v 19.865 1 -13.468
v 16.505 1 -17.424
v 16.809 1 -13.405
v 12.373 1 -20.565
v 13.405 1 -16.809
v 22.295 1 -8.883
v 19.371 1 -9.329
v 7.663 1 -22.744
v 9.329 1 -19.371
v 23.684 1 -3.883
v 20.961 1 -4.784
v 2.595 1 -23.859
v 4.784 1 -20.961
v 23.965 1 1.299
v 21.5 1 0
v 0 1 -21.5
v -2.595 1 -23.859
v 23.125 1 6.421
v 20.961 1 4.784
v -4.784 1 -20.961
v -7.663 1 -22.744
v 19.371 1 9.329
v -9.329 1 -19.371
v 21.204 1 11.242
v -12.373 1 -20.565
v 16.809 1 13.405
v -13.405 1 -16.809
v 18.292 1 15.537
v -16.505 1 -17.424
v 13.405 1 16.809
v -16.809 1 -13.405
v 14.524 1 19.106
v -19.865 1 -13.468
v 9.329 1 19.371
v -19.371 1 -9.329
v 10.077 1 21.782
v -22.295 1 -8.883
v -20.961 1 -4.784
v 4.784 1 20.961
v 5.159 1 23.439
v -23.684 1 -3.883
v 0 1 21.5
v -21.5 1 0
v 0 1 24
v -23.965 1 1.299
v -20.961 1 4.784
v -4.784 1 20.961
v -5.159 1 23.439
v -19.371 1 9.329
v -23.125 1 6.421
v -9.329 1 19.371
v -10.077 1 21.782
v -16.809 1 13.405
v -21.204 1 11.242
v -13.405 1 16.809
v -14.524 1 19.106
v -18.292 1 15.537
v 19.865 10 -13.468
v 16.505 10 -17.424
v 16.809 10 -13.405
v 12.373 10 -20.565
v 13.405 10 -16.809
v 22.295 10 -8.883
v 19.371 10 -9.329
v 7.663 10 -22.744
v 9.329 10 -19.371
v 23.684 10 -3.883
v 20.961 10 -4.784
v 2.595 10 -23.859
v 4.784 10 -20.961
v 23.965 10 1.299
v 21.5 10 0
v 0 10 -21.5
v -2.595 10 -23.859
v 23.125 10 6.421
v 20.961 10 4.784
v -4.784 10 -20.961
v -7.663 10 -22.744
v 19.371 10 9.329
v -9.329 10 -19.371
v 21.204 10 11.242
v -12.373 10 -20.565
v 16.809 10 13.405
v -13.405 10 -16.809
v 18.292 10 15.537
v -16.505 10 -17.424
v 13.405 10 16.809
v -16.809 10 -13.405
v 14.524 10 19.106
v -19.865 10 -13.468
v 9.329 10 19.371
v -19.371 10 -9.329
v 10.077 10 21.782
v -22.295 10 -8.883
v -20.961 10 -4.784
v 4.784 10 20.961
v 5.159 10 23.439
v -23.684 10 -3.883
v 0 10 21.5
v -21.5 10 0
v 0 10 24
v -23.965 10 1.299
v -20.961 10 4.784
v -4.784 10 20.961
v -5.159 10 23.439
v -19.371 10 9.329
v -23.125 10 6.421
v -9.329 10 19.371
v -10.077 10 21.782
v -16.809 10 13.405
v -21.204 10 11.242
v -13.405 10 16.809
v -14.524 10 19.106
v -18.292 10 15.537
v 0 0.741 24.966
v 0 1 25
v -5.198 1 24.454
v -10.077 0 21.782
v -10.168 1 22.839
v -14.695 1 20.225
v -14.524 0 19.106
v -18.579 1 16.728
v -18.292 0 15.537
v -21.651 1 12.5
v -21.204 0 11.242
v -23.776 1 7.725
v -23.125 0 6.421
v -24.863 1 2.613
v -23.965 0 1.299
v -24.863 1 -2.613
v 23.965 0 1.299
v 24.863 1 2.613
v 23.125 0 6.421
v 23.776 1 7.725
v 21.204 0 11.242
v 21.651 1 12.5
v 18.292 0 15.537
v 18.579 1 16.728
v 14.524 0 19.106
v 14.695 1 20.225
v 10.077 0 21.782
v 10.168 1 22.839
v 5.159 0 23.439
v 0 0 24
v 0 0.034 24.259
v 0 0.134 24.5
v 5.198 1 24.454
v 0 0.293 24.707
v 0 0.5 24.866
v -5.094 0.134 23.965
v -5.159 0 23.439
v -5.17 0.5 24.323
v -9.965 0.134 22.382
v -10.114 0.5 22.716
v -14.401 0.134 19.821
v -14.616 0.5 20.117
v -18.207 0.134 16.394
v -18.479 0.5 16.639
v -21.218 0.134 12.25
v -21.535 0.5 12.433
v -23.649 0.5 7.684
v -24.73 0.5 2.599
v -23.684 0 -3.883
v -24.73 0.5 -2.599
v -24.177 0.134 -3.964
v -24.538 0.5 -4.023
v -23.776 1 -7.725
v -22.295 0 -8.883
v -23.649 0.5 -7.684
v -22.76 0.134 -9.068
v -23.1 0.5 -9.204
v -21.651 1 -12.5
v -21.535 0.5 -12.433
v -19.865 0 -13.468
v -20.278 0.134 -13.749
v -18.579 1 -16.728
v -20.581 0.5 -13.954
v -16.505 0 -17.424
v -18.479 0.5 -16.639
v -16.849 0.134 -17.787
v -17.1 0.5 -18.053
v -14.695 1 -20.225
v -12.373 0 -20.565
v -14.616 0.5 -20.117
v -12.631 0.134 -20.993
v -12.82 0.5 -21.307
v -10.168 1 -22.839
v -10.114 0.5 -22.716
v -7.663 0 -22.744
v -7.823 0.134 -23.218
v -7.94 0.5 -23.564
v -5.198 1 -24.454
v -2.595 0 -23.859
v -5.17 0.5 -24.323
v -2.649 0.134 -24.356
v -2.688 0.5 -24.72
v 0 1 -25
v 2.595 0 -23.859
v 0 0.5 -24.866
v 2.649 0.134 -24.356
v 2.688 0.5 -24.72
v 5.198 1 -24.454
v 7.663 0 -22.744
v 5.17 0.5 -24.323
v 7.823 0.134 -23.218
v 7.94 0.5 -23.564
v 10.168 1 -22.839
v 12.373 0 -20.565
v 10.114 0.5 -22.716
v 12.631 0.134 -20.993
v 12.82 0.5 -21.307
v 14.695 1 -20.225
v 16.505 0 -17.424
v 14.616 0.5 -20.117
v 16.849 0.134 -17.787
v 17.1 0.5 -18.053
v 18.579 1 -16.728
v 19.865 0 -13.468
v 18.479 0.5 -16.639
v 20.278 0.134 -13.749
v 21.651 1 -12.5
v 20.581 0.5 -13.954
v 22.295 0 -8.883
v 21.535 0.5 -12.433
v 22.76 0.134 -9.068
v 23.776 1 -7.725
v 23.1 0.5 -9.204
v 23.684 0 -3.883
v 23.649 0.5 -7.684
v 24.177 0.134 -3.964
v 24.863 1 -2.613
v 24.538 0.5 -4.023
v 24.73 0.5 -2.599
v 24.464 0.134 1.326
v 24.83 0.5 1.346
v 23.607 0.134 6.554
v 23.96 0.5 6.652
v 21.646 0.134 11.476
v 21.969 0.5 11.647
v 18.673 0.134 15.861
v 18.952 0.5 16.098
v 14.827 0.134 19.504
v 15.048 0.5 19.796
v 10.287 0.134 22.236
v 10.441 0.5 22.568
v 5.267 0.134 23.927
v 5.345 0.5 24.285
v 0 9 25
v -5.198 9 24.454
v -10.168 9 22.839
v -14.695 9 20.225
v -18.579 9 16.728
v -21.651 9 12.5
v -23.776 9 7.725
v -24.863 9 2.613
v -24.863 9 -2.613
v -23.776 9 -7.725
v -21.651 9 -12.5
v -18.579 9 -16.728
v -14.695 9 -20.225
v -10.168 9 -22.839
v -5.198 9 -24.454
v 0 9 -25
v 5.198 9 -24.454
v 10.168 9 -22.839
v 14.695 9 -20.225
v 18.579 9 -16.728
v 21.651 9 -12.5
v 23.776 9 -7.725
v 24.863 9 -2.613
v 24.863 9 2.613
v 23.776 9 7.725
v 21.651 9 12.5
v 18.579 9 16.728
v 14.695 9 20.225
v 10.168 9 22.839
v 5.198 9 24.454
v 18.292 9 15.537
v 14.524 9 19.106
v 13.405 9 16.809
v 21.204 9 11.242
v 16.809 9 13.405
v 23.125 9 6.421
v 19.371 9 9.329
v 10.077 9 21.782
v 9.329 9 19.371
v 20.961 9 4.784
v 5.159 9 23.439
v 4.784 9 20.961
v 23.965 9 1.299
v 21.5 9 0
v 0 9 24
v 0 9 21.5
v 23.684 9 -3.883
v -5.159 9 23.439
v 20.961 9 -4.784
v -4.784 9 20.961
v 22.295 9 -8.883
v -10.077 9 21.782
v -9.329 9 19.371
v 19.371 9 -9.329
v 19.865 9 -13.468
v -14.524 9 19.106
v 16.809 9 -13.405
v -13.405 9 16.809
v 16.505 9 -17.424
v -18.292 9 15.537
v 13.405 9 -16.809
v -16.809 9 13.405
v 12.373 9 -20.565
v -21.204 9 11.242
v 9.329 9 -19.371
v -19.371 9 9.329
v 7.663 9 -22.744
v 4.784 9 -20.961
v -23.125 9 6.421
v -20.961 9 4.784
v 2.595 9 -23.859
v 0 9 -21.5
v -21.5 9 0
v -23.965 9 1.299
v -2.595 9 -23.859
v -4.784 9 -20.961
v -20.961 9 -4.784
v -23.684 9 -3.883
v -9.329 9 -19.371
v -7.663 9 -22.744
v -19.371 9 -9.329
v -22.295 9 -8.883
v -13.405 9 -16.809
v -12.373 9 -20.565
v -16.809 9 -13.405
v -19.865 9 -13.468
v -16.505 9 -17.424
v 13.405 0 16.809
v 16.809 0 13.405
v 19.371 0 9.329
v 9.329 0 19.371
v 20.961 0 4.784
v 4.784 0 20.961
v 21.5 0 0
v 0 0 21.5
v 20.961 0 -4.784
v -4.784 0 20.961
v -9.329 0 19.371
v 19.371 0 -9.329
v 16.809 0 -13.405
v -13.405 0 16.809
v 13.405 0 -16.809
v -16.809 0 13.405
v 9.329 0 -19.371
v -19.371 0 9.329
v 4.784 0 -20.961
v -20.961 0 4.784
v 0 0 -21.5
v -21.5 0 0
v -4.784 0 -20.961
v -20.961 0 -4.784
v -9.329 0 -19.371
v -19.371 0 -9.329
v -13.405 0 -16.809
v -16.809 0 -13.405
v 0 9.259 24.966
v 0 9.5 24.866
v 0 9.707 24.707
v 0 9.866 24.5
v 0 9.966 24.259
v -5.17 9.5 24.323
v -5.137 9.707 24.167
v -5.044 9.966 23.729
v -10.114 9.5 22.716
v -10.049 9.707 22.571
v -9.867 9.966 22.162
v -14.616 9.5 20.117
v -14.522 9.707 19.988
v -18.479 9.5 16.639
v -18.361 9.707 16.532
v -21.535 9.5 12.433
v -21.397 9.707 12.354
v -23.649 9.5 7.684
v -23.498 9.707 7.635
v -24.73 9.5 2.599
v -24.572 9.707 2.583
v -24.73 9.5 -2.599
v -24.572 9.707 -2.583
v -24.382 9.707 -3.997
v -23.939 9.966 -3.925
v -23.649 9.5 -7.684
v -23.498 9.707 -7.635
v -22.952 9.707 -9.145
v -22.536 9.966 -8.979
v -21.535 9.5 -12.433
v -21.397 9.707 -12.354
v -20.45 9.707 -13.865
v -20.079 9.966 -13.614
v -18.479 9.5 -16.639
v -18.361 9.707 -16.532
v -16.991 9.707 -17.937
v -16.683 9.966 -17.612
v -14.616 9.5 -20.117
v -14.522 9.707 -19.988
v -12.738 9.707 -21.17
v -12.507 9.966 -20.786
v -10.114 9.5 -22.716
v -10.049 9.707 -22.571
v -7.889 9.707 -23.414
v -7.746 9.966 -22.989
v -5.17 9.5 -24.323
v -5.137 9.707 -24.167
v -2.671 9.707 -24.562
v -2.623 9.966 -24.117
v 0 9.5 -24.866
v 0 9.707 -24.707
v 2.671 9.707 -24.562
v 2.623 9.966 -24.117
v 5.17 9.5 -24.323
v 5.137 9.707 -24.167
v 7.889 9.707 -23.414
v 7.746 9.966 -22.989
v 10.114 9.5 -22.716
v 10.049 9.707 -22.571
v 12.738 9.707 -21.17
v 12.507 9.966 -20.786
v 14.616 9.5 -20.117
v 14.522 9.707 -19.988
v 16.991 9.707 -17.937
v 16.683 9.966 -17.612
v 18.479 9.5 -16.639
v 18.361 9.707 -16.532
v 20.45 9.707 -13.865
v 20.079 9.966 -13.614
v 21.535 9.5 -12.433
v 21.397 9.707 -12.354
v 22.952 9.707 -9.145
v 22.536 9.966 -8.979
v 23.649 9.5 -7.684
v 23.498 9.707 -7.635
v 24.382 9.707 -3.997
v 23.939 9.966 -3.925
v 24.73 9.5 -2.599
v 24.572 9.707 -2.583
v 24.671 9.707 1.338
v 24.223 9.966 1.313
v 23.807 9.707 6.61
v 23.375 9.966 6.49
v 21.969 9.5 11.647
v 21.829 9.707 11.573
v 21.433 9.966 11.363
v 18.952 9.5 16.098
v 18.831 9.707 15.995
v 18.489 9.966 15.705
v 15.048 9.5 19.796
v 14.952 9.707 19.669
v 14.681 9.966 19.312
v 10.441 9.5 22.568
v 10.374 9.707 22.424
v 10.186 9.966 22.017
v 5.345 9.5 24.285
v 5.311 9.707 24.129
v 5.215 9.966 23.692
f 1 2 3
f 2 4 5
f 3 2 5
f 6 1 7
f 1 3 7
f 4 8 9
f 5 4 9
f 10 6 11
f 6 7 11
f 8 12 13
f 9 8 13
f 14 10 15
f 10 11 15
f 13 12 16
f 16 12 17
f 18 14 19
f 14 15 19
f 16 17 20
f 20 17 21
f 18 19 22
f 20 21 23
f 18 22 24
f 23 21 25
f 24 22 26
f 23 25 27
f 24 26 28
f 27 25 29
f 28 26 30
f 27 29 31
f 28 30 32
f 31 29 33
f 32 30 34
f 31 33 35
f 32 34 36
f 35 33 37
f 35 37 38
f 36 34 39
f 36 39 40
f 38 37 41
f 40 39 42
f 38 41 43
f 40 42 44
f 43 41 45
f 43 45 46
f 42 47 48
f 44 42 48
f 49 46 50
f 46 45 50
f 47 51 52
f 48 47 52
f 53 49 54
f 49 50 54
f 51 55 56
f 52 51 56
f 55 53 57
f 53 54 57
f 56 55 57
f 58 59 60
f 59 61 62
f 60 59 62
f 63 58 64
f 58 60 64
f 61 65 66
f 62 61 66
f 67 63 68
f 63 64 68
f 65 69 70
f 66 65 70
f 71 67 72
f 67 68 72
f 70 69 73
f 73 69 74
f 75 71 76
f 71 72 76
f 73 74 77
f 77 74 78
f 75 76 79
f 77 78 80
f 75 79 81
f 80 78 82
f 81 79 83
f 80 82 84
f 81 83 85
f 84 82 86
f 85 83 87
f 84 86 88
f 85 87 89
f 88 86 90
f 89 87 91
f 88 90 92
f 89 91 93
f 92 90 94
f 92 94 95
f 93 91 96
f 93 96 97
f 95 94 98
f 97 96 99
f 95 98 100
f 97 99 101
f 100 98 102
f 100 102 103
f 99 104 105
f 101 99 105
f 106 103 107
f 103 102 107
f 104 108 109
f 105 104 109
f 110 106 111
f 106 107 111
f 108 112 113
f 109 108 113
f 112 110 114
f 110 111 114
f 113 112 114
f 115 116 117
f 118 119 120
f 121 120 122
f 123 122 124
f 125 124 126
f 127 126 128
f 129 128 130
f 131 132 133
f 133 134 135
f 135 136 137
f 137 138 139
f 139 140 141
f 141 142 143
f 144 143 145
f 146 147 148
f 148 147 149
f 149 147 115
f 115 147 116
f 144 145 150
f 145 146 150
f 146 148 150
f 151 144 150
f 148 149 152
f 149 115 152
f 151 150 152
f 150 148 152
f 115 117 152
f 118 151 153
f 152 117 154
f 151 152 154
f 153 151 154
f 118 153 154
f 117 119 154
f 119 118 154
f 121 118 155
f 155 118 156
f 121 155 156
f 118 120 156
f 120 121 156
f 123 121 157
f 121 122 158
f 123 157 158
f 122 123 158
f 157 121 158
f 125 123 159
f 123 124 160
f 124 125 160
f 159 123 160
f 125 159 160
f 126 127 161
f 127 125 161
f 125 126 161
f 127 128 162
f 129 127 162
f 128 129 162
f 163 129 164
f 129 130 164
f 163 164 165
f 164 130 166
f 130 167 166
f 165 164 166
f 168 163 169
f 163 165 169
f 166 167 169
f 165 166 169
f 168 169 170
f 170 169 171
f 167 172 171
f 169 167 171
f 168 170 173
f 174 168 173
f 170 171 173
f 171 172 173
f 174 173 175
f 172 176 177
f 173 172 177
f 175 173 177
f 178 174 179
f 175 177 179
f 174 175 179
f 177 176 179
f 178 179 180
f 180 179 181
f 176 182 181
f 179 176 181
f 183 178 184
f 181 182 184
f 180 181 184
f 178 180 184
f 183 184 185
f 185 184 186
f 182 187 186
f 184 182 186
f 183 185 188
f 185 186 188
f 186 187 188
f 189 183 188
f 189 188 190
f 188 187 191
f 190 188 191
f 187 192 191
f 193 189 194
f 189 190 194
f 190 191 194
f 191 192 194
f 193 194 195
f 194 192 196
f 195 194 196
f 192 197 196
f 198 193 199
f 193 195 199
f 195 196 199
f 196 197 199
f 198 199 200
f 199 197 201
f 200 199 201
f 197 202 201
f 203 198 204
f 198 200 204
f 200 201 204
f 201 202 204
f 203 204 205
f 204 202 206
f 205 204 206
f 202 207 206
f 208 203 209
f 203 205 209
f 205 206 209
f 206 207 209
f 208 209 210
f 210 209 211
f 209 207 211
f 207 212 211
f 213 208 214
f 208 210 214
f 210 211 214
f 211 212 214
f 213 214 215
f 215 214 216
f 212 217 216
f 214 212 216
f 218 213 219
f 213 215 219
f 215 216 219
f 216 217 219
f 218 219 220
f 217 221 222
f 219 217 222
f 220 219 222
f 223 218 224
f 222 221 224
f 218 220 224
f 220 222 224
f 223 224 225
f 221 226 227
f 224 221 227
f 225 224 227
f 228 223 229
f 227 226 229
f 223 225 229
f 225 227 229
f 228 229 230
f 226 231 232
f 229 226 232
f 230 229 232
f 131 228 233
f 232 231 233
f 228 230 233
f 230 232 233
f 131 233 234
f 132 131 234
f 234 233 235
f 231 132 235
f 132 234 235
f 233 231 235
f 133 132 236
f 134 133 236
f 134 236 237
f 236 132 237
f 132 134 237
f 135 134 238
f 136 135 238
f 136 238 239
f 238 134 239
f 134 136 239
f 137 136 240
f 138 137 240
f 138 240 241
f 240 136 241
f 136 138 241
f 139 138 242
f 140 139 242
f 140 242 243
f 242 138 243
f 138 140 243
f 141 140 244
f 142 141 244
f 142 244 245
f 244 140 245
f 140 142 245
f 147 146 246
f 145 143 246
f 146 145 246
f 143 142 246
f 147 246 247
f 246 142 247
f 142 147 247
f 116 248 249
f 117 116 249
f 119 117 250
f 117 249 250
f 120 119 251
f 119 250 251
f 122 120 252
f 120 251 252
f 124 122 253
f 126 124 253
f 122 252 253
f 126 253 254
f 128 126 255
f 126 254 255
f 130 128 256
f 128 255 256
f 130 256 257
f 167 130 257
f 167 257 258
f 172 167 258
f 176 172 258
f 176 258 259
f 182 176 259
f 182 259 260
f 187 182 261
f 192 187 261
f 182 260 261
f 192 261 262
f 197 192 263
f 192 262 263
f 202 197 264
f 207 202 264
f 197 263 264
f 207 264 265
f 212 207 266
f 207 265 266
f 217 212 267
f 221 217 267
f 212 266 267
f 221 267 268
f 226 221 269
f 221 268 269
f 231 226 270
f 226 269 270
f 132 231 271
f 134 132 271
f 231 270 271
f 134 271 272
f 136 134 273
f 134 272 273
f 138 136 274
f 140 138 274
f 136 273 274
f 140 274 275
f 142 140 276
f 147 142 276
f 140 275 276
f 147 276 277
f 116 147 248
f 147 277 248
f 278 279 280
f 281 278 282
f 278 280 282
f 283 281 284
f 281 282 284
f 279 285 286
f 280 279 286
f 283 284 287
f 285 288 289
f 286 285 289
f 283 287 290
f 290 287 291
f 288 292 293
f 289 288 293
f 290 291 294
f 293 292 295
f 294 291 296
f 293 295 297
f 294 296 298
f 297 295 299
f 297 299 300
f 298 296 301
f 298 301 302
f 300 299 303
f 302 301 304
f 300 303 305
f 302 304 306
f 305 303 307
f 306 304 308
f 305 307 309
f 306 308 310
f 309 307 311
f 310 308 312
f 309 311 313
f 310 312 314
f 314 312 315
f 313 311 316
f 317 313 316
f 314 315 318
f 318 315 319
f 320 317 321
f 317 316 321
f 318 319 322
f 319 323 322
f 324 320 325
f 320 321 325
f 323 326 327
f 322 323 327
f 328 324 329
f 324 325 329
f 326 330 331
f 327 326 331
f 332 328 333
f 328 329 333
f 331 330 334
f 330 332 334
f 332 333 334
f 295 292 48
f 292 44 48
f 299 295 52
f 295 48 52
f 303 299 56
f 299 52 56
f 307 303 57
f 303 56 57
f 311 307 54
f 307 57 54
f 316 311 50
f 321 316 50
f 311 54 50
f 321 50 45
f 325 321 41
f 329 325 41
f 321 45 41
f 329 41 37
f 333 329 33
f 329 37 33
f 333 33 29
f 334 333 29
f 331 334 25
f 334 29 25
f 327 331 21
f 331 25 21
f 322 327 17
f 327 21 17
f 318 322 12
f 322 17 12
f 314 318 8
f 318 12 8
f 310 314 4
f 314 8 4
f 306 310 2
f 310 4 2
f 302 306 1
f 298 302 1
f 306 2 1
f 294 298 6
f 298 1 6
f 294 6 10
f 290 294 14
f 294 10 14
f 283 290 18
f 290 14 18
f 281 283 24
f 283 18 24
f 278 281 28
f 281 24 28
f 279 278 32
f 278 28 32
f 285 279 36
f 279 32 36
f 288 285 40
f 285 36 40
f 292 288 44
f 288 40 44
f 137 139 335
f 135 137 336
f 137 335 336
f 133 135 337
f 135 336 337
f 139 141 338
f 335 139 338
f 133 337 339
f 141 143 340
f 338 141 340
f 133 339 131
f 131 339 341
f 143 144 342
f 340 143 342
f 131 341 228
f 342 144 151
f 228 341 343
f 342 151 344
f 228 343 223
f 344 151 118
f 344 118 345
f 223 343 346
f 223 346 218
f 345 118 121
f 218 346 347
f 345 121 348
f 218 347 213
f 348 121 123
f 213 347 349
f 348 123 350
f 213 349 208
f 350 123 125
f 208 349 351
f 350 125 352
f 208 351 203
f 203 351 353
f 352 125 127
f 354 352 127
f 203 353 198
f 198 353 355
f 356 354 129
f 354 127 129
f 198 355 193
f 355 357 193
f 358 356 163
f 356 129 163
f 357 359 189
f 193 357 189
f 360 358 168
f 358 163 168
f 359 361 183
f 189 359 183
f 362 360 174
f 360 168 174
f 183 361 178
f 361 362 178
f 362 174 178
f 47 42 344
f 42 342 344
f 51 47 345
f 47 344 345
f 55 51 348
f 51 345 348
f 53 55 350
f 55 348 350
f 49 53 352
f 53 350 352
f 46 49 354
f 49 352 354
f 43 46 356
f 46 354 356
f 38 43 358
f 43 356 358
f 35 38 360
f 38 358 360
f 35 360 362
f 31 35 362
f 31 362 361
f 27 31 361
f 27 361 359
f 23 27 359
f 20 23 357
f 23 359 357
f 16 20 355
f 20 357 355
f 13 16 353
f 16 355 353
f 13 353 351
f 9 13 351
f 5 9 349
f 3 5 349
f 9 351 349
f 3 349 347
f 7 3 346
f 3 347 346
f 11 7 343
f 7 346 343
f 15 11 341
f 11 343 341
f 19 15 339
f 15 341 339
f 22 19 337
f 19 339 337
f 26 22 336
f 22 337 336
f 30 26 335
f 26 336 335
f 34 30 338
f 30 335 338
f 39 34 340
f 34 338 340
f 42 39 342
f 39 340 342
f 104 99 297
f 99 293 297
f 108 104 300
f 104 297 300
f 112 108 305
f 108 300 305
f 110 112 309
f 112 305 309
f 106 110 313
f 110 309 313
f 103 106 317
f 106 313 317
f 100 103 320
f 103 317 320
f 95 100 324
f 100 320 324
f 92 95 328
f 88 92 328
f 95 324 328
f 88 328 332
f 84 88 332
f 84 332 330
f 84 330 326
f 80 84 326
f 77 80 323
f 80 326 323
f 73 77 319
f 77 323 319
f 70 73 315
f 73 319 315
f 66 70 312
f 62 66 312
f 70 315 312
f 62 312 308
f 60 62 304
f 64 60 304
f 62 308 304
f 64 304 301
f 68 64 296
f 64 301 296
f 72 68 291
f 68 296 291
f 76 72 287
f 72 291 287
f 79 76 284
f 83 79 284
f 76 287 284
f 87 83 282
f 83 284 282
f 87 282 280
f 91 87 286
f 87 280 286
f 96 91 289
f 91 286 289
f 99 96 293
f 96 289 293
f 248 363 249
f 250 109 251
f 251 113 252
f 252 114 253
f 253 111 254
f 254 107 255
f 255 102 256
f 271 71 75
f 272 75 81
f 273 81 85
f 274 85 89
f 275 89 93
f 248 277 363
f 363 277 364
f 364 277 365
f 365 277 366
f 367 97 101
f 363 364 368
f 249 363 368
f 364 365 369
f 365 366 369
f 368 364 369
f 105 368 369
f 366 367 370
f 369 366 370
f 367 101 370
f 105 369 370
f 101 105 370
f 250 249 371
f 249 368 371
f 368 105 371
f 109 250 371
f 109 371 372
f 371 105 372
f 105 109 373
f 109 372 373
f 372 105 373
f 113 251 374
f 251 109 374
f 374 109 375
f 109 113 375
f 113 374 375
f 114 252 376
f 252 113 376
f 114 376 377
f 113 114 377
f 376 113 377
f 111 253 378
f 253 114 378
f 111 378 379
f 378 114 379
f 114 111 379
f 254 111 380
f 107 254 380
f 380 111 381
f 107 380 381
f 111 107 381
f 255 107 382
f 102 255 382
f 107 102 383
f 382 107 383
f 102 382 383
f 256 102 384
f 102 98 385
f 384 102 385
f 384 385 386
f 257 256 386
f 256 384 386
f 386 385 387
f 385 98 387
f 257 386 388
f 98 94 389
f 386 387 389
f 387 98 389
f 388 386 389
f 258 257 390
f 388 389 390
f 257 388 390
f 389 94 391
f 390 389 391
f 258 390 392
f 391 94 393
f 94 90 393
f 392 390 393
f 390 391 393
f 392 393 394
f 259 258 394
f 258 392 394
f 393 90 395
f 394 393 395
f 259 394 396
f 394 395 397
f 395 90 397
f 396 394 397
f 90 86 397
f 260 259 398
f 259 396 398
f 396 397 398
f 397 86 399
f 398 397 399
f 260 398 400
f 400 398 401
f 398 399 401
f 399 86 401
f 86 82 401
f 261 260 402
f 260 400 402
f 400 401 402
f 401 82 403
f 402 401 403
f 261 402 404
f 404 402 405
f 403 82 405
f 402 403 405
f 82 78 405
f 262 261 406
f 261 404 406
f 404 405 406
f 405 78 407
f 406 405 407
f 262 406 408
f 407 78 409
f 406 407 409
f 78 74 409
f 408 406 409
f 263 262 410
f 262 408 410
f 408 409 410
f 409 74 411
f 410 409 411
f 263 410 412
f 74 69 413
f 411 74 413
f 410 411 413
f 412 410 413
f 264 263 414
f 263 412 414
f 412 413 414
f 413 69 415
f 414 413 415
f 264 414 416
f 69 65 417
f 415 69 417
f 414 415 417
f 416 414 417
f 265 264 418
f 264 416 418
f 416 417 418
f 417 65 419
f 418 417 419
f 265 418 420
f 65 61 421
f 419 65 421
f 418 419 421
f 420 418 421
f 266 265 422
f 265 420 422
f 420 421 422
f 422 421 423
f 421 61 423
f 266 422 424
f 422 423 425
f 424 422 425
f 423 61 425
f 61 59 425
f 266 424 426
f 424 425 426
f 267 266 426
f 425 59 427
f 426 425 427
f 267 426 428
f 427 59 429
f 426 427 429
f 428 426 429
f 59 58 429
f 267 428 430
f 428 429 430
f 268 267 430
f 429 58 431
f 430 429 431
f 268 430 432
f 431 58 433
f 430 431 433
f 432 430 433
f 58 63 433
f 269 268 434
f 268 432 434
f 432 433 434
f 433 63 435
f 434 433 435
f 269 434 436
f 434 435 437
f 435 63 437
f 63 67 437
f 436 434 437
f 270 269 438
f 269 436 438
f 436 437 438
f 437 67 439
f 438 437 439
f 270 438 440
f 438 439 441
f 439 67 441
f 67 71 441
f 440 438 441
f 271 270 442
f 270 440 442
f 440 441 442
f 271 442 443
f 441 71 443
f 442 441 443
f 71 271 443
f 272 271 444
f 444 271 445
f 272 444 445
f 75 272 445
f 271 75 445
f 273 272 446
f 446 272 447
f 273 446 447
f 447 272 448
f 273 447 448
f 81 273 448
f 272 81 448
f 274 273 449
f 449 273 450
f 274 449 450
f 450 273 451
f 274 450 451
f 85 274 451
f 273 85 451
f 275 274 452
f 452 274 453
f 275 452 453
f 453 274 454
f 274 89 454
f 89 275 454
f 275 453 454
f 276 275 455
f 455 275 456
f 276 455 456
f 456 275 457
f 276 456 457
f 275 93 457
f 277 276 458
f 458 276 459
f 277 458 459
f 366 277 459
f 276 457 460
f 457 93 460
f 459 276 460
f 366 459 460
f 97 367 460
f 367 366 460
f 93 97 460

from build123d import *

# Parameters (mm, degrees)
FILLET1_R = 1


with BuildPart() as part:
    # Sketch1 → Revolve1 (revolve)
    with BuildSketch(Plane.XY, mode=Mode.PRIVATE) as revolve1_sk:
        Polygon((-21.5, 0), (-25, 0), (-25, 10), (-21.5, 10), (-21.5, 9), (-24, 9), (-24, 1), (-21.5, 1), align=None)
    revolve(revolve1_sk.sketch.rotate(Axis((0, 9.085123741, 0), (0, -1, 0)), 270), axis=Axis((0, 9.085123741, 0), (0, -1, 0)))

    # Fillet1
    fillet1_edges = [part.edges().sort_by_distance(p)[0] for p in [
        (0, 0, -25),
        (0, 10, -25),
    ]]
    fillet(fillet1_edges, radius=FILLET1_R)


solid = part.part
